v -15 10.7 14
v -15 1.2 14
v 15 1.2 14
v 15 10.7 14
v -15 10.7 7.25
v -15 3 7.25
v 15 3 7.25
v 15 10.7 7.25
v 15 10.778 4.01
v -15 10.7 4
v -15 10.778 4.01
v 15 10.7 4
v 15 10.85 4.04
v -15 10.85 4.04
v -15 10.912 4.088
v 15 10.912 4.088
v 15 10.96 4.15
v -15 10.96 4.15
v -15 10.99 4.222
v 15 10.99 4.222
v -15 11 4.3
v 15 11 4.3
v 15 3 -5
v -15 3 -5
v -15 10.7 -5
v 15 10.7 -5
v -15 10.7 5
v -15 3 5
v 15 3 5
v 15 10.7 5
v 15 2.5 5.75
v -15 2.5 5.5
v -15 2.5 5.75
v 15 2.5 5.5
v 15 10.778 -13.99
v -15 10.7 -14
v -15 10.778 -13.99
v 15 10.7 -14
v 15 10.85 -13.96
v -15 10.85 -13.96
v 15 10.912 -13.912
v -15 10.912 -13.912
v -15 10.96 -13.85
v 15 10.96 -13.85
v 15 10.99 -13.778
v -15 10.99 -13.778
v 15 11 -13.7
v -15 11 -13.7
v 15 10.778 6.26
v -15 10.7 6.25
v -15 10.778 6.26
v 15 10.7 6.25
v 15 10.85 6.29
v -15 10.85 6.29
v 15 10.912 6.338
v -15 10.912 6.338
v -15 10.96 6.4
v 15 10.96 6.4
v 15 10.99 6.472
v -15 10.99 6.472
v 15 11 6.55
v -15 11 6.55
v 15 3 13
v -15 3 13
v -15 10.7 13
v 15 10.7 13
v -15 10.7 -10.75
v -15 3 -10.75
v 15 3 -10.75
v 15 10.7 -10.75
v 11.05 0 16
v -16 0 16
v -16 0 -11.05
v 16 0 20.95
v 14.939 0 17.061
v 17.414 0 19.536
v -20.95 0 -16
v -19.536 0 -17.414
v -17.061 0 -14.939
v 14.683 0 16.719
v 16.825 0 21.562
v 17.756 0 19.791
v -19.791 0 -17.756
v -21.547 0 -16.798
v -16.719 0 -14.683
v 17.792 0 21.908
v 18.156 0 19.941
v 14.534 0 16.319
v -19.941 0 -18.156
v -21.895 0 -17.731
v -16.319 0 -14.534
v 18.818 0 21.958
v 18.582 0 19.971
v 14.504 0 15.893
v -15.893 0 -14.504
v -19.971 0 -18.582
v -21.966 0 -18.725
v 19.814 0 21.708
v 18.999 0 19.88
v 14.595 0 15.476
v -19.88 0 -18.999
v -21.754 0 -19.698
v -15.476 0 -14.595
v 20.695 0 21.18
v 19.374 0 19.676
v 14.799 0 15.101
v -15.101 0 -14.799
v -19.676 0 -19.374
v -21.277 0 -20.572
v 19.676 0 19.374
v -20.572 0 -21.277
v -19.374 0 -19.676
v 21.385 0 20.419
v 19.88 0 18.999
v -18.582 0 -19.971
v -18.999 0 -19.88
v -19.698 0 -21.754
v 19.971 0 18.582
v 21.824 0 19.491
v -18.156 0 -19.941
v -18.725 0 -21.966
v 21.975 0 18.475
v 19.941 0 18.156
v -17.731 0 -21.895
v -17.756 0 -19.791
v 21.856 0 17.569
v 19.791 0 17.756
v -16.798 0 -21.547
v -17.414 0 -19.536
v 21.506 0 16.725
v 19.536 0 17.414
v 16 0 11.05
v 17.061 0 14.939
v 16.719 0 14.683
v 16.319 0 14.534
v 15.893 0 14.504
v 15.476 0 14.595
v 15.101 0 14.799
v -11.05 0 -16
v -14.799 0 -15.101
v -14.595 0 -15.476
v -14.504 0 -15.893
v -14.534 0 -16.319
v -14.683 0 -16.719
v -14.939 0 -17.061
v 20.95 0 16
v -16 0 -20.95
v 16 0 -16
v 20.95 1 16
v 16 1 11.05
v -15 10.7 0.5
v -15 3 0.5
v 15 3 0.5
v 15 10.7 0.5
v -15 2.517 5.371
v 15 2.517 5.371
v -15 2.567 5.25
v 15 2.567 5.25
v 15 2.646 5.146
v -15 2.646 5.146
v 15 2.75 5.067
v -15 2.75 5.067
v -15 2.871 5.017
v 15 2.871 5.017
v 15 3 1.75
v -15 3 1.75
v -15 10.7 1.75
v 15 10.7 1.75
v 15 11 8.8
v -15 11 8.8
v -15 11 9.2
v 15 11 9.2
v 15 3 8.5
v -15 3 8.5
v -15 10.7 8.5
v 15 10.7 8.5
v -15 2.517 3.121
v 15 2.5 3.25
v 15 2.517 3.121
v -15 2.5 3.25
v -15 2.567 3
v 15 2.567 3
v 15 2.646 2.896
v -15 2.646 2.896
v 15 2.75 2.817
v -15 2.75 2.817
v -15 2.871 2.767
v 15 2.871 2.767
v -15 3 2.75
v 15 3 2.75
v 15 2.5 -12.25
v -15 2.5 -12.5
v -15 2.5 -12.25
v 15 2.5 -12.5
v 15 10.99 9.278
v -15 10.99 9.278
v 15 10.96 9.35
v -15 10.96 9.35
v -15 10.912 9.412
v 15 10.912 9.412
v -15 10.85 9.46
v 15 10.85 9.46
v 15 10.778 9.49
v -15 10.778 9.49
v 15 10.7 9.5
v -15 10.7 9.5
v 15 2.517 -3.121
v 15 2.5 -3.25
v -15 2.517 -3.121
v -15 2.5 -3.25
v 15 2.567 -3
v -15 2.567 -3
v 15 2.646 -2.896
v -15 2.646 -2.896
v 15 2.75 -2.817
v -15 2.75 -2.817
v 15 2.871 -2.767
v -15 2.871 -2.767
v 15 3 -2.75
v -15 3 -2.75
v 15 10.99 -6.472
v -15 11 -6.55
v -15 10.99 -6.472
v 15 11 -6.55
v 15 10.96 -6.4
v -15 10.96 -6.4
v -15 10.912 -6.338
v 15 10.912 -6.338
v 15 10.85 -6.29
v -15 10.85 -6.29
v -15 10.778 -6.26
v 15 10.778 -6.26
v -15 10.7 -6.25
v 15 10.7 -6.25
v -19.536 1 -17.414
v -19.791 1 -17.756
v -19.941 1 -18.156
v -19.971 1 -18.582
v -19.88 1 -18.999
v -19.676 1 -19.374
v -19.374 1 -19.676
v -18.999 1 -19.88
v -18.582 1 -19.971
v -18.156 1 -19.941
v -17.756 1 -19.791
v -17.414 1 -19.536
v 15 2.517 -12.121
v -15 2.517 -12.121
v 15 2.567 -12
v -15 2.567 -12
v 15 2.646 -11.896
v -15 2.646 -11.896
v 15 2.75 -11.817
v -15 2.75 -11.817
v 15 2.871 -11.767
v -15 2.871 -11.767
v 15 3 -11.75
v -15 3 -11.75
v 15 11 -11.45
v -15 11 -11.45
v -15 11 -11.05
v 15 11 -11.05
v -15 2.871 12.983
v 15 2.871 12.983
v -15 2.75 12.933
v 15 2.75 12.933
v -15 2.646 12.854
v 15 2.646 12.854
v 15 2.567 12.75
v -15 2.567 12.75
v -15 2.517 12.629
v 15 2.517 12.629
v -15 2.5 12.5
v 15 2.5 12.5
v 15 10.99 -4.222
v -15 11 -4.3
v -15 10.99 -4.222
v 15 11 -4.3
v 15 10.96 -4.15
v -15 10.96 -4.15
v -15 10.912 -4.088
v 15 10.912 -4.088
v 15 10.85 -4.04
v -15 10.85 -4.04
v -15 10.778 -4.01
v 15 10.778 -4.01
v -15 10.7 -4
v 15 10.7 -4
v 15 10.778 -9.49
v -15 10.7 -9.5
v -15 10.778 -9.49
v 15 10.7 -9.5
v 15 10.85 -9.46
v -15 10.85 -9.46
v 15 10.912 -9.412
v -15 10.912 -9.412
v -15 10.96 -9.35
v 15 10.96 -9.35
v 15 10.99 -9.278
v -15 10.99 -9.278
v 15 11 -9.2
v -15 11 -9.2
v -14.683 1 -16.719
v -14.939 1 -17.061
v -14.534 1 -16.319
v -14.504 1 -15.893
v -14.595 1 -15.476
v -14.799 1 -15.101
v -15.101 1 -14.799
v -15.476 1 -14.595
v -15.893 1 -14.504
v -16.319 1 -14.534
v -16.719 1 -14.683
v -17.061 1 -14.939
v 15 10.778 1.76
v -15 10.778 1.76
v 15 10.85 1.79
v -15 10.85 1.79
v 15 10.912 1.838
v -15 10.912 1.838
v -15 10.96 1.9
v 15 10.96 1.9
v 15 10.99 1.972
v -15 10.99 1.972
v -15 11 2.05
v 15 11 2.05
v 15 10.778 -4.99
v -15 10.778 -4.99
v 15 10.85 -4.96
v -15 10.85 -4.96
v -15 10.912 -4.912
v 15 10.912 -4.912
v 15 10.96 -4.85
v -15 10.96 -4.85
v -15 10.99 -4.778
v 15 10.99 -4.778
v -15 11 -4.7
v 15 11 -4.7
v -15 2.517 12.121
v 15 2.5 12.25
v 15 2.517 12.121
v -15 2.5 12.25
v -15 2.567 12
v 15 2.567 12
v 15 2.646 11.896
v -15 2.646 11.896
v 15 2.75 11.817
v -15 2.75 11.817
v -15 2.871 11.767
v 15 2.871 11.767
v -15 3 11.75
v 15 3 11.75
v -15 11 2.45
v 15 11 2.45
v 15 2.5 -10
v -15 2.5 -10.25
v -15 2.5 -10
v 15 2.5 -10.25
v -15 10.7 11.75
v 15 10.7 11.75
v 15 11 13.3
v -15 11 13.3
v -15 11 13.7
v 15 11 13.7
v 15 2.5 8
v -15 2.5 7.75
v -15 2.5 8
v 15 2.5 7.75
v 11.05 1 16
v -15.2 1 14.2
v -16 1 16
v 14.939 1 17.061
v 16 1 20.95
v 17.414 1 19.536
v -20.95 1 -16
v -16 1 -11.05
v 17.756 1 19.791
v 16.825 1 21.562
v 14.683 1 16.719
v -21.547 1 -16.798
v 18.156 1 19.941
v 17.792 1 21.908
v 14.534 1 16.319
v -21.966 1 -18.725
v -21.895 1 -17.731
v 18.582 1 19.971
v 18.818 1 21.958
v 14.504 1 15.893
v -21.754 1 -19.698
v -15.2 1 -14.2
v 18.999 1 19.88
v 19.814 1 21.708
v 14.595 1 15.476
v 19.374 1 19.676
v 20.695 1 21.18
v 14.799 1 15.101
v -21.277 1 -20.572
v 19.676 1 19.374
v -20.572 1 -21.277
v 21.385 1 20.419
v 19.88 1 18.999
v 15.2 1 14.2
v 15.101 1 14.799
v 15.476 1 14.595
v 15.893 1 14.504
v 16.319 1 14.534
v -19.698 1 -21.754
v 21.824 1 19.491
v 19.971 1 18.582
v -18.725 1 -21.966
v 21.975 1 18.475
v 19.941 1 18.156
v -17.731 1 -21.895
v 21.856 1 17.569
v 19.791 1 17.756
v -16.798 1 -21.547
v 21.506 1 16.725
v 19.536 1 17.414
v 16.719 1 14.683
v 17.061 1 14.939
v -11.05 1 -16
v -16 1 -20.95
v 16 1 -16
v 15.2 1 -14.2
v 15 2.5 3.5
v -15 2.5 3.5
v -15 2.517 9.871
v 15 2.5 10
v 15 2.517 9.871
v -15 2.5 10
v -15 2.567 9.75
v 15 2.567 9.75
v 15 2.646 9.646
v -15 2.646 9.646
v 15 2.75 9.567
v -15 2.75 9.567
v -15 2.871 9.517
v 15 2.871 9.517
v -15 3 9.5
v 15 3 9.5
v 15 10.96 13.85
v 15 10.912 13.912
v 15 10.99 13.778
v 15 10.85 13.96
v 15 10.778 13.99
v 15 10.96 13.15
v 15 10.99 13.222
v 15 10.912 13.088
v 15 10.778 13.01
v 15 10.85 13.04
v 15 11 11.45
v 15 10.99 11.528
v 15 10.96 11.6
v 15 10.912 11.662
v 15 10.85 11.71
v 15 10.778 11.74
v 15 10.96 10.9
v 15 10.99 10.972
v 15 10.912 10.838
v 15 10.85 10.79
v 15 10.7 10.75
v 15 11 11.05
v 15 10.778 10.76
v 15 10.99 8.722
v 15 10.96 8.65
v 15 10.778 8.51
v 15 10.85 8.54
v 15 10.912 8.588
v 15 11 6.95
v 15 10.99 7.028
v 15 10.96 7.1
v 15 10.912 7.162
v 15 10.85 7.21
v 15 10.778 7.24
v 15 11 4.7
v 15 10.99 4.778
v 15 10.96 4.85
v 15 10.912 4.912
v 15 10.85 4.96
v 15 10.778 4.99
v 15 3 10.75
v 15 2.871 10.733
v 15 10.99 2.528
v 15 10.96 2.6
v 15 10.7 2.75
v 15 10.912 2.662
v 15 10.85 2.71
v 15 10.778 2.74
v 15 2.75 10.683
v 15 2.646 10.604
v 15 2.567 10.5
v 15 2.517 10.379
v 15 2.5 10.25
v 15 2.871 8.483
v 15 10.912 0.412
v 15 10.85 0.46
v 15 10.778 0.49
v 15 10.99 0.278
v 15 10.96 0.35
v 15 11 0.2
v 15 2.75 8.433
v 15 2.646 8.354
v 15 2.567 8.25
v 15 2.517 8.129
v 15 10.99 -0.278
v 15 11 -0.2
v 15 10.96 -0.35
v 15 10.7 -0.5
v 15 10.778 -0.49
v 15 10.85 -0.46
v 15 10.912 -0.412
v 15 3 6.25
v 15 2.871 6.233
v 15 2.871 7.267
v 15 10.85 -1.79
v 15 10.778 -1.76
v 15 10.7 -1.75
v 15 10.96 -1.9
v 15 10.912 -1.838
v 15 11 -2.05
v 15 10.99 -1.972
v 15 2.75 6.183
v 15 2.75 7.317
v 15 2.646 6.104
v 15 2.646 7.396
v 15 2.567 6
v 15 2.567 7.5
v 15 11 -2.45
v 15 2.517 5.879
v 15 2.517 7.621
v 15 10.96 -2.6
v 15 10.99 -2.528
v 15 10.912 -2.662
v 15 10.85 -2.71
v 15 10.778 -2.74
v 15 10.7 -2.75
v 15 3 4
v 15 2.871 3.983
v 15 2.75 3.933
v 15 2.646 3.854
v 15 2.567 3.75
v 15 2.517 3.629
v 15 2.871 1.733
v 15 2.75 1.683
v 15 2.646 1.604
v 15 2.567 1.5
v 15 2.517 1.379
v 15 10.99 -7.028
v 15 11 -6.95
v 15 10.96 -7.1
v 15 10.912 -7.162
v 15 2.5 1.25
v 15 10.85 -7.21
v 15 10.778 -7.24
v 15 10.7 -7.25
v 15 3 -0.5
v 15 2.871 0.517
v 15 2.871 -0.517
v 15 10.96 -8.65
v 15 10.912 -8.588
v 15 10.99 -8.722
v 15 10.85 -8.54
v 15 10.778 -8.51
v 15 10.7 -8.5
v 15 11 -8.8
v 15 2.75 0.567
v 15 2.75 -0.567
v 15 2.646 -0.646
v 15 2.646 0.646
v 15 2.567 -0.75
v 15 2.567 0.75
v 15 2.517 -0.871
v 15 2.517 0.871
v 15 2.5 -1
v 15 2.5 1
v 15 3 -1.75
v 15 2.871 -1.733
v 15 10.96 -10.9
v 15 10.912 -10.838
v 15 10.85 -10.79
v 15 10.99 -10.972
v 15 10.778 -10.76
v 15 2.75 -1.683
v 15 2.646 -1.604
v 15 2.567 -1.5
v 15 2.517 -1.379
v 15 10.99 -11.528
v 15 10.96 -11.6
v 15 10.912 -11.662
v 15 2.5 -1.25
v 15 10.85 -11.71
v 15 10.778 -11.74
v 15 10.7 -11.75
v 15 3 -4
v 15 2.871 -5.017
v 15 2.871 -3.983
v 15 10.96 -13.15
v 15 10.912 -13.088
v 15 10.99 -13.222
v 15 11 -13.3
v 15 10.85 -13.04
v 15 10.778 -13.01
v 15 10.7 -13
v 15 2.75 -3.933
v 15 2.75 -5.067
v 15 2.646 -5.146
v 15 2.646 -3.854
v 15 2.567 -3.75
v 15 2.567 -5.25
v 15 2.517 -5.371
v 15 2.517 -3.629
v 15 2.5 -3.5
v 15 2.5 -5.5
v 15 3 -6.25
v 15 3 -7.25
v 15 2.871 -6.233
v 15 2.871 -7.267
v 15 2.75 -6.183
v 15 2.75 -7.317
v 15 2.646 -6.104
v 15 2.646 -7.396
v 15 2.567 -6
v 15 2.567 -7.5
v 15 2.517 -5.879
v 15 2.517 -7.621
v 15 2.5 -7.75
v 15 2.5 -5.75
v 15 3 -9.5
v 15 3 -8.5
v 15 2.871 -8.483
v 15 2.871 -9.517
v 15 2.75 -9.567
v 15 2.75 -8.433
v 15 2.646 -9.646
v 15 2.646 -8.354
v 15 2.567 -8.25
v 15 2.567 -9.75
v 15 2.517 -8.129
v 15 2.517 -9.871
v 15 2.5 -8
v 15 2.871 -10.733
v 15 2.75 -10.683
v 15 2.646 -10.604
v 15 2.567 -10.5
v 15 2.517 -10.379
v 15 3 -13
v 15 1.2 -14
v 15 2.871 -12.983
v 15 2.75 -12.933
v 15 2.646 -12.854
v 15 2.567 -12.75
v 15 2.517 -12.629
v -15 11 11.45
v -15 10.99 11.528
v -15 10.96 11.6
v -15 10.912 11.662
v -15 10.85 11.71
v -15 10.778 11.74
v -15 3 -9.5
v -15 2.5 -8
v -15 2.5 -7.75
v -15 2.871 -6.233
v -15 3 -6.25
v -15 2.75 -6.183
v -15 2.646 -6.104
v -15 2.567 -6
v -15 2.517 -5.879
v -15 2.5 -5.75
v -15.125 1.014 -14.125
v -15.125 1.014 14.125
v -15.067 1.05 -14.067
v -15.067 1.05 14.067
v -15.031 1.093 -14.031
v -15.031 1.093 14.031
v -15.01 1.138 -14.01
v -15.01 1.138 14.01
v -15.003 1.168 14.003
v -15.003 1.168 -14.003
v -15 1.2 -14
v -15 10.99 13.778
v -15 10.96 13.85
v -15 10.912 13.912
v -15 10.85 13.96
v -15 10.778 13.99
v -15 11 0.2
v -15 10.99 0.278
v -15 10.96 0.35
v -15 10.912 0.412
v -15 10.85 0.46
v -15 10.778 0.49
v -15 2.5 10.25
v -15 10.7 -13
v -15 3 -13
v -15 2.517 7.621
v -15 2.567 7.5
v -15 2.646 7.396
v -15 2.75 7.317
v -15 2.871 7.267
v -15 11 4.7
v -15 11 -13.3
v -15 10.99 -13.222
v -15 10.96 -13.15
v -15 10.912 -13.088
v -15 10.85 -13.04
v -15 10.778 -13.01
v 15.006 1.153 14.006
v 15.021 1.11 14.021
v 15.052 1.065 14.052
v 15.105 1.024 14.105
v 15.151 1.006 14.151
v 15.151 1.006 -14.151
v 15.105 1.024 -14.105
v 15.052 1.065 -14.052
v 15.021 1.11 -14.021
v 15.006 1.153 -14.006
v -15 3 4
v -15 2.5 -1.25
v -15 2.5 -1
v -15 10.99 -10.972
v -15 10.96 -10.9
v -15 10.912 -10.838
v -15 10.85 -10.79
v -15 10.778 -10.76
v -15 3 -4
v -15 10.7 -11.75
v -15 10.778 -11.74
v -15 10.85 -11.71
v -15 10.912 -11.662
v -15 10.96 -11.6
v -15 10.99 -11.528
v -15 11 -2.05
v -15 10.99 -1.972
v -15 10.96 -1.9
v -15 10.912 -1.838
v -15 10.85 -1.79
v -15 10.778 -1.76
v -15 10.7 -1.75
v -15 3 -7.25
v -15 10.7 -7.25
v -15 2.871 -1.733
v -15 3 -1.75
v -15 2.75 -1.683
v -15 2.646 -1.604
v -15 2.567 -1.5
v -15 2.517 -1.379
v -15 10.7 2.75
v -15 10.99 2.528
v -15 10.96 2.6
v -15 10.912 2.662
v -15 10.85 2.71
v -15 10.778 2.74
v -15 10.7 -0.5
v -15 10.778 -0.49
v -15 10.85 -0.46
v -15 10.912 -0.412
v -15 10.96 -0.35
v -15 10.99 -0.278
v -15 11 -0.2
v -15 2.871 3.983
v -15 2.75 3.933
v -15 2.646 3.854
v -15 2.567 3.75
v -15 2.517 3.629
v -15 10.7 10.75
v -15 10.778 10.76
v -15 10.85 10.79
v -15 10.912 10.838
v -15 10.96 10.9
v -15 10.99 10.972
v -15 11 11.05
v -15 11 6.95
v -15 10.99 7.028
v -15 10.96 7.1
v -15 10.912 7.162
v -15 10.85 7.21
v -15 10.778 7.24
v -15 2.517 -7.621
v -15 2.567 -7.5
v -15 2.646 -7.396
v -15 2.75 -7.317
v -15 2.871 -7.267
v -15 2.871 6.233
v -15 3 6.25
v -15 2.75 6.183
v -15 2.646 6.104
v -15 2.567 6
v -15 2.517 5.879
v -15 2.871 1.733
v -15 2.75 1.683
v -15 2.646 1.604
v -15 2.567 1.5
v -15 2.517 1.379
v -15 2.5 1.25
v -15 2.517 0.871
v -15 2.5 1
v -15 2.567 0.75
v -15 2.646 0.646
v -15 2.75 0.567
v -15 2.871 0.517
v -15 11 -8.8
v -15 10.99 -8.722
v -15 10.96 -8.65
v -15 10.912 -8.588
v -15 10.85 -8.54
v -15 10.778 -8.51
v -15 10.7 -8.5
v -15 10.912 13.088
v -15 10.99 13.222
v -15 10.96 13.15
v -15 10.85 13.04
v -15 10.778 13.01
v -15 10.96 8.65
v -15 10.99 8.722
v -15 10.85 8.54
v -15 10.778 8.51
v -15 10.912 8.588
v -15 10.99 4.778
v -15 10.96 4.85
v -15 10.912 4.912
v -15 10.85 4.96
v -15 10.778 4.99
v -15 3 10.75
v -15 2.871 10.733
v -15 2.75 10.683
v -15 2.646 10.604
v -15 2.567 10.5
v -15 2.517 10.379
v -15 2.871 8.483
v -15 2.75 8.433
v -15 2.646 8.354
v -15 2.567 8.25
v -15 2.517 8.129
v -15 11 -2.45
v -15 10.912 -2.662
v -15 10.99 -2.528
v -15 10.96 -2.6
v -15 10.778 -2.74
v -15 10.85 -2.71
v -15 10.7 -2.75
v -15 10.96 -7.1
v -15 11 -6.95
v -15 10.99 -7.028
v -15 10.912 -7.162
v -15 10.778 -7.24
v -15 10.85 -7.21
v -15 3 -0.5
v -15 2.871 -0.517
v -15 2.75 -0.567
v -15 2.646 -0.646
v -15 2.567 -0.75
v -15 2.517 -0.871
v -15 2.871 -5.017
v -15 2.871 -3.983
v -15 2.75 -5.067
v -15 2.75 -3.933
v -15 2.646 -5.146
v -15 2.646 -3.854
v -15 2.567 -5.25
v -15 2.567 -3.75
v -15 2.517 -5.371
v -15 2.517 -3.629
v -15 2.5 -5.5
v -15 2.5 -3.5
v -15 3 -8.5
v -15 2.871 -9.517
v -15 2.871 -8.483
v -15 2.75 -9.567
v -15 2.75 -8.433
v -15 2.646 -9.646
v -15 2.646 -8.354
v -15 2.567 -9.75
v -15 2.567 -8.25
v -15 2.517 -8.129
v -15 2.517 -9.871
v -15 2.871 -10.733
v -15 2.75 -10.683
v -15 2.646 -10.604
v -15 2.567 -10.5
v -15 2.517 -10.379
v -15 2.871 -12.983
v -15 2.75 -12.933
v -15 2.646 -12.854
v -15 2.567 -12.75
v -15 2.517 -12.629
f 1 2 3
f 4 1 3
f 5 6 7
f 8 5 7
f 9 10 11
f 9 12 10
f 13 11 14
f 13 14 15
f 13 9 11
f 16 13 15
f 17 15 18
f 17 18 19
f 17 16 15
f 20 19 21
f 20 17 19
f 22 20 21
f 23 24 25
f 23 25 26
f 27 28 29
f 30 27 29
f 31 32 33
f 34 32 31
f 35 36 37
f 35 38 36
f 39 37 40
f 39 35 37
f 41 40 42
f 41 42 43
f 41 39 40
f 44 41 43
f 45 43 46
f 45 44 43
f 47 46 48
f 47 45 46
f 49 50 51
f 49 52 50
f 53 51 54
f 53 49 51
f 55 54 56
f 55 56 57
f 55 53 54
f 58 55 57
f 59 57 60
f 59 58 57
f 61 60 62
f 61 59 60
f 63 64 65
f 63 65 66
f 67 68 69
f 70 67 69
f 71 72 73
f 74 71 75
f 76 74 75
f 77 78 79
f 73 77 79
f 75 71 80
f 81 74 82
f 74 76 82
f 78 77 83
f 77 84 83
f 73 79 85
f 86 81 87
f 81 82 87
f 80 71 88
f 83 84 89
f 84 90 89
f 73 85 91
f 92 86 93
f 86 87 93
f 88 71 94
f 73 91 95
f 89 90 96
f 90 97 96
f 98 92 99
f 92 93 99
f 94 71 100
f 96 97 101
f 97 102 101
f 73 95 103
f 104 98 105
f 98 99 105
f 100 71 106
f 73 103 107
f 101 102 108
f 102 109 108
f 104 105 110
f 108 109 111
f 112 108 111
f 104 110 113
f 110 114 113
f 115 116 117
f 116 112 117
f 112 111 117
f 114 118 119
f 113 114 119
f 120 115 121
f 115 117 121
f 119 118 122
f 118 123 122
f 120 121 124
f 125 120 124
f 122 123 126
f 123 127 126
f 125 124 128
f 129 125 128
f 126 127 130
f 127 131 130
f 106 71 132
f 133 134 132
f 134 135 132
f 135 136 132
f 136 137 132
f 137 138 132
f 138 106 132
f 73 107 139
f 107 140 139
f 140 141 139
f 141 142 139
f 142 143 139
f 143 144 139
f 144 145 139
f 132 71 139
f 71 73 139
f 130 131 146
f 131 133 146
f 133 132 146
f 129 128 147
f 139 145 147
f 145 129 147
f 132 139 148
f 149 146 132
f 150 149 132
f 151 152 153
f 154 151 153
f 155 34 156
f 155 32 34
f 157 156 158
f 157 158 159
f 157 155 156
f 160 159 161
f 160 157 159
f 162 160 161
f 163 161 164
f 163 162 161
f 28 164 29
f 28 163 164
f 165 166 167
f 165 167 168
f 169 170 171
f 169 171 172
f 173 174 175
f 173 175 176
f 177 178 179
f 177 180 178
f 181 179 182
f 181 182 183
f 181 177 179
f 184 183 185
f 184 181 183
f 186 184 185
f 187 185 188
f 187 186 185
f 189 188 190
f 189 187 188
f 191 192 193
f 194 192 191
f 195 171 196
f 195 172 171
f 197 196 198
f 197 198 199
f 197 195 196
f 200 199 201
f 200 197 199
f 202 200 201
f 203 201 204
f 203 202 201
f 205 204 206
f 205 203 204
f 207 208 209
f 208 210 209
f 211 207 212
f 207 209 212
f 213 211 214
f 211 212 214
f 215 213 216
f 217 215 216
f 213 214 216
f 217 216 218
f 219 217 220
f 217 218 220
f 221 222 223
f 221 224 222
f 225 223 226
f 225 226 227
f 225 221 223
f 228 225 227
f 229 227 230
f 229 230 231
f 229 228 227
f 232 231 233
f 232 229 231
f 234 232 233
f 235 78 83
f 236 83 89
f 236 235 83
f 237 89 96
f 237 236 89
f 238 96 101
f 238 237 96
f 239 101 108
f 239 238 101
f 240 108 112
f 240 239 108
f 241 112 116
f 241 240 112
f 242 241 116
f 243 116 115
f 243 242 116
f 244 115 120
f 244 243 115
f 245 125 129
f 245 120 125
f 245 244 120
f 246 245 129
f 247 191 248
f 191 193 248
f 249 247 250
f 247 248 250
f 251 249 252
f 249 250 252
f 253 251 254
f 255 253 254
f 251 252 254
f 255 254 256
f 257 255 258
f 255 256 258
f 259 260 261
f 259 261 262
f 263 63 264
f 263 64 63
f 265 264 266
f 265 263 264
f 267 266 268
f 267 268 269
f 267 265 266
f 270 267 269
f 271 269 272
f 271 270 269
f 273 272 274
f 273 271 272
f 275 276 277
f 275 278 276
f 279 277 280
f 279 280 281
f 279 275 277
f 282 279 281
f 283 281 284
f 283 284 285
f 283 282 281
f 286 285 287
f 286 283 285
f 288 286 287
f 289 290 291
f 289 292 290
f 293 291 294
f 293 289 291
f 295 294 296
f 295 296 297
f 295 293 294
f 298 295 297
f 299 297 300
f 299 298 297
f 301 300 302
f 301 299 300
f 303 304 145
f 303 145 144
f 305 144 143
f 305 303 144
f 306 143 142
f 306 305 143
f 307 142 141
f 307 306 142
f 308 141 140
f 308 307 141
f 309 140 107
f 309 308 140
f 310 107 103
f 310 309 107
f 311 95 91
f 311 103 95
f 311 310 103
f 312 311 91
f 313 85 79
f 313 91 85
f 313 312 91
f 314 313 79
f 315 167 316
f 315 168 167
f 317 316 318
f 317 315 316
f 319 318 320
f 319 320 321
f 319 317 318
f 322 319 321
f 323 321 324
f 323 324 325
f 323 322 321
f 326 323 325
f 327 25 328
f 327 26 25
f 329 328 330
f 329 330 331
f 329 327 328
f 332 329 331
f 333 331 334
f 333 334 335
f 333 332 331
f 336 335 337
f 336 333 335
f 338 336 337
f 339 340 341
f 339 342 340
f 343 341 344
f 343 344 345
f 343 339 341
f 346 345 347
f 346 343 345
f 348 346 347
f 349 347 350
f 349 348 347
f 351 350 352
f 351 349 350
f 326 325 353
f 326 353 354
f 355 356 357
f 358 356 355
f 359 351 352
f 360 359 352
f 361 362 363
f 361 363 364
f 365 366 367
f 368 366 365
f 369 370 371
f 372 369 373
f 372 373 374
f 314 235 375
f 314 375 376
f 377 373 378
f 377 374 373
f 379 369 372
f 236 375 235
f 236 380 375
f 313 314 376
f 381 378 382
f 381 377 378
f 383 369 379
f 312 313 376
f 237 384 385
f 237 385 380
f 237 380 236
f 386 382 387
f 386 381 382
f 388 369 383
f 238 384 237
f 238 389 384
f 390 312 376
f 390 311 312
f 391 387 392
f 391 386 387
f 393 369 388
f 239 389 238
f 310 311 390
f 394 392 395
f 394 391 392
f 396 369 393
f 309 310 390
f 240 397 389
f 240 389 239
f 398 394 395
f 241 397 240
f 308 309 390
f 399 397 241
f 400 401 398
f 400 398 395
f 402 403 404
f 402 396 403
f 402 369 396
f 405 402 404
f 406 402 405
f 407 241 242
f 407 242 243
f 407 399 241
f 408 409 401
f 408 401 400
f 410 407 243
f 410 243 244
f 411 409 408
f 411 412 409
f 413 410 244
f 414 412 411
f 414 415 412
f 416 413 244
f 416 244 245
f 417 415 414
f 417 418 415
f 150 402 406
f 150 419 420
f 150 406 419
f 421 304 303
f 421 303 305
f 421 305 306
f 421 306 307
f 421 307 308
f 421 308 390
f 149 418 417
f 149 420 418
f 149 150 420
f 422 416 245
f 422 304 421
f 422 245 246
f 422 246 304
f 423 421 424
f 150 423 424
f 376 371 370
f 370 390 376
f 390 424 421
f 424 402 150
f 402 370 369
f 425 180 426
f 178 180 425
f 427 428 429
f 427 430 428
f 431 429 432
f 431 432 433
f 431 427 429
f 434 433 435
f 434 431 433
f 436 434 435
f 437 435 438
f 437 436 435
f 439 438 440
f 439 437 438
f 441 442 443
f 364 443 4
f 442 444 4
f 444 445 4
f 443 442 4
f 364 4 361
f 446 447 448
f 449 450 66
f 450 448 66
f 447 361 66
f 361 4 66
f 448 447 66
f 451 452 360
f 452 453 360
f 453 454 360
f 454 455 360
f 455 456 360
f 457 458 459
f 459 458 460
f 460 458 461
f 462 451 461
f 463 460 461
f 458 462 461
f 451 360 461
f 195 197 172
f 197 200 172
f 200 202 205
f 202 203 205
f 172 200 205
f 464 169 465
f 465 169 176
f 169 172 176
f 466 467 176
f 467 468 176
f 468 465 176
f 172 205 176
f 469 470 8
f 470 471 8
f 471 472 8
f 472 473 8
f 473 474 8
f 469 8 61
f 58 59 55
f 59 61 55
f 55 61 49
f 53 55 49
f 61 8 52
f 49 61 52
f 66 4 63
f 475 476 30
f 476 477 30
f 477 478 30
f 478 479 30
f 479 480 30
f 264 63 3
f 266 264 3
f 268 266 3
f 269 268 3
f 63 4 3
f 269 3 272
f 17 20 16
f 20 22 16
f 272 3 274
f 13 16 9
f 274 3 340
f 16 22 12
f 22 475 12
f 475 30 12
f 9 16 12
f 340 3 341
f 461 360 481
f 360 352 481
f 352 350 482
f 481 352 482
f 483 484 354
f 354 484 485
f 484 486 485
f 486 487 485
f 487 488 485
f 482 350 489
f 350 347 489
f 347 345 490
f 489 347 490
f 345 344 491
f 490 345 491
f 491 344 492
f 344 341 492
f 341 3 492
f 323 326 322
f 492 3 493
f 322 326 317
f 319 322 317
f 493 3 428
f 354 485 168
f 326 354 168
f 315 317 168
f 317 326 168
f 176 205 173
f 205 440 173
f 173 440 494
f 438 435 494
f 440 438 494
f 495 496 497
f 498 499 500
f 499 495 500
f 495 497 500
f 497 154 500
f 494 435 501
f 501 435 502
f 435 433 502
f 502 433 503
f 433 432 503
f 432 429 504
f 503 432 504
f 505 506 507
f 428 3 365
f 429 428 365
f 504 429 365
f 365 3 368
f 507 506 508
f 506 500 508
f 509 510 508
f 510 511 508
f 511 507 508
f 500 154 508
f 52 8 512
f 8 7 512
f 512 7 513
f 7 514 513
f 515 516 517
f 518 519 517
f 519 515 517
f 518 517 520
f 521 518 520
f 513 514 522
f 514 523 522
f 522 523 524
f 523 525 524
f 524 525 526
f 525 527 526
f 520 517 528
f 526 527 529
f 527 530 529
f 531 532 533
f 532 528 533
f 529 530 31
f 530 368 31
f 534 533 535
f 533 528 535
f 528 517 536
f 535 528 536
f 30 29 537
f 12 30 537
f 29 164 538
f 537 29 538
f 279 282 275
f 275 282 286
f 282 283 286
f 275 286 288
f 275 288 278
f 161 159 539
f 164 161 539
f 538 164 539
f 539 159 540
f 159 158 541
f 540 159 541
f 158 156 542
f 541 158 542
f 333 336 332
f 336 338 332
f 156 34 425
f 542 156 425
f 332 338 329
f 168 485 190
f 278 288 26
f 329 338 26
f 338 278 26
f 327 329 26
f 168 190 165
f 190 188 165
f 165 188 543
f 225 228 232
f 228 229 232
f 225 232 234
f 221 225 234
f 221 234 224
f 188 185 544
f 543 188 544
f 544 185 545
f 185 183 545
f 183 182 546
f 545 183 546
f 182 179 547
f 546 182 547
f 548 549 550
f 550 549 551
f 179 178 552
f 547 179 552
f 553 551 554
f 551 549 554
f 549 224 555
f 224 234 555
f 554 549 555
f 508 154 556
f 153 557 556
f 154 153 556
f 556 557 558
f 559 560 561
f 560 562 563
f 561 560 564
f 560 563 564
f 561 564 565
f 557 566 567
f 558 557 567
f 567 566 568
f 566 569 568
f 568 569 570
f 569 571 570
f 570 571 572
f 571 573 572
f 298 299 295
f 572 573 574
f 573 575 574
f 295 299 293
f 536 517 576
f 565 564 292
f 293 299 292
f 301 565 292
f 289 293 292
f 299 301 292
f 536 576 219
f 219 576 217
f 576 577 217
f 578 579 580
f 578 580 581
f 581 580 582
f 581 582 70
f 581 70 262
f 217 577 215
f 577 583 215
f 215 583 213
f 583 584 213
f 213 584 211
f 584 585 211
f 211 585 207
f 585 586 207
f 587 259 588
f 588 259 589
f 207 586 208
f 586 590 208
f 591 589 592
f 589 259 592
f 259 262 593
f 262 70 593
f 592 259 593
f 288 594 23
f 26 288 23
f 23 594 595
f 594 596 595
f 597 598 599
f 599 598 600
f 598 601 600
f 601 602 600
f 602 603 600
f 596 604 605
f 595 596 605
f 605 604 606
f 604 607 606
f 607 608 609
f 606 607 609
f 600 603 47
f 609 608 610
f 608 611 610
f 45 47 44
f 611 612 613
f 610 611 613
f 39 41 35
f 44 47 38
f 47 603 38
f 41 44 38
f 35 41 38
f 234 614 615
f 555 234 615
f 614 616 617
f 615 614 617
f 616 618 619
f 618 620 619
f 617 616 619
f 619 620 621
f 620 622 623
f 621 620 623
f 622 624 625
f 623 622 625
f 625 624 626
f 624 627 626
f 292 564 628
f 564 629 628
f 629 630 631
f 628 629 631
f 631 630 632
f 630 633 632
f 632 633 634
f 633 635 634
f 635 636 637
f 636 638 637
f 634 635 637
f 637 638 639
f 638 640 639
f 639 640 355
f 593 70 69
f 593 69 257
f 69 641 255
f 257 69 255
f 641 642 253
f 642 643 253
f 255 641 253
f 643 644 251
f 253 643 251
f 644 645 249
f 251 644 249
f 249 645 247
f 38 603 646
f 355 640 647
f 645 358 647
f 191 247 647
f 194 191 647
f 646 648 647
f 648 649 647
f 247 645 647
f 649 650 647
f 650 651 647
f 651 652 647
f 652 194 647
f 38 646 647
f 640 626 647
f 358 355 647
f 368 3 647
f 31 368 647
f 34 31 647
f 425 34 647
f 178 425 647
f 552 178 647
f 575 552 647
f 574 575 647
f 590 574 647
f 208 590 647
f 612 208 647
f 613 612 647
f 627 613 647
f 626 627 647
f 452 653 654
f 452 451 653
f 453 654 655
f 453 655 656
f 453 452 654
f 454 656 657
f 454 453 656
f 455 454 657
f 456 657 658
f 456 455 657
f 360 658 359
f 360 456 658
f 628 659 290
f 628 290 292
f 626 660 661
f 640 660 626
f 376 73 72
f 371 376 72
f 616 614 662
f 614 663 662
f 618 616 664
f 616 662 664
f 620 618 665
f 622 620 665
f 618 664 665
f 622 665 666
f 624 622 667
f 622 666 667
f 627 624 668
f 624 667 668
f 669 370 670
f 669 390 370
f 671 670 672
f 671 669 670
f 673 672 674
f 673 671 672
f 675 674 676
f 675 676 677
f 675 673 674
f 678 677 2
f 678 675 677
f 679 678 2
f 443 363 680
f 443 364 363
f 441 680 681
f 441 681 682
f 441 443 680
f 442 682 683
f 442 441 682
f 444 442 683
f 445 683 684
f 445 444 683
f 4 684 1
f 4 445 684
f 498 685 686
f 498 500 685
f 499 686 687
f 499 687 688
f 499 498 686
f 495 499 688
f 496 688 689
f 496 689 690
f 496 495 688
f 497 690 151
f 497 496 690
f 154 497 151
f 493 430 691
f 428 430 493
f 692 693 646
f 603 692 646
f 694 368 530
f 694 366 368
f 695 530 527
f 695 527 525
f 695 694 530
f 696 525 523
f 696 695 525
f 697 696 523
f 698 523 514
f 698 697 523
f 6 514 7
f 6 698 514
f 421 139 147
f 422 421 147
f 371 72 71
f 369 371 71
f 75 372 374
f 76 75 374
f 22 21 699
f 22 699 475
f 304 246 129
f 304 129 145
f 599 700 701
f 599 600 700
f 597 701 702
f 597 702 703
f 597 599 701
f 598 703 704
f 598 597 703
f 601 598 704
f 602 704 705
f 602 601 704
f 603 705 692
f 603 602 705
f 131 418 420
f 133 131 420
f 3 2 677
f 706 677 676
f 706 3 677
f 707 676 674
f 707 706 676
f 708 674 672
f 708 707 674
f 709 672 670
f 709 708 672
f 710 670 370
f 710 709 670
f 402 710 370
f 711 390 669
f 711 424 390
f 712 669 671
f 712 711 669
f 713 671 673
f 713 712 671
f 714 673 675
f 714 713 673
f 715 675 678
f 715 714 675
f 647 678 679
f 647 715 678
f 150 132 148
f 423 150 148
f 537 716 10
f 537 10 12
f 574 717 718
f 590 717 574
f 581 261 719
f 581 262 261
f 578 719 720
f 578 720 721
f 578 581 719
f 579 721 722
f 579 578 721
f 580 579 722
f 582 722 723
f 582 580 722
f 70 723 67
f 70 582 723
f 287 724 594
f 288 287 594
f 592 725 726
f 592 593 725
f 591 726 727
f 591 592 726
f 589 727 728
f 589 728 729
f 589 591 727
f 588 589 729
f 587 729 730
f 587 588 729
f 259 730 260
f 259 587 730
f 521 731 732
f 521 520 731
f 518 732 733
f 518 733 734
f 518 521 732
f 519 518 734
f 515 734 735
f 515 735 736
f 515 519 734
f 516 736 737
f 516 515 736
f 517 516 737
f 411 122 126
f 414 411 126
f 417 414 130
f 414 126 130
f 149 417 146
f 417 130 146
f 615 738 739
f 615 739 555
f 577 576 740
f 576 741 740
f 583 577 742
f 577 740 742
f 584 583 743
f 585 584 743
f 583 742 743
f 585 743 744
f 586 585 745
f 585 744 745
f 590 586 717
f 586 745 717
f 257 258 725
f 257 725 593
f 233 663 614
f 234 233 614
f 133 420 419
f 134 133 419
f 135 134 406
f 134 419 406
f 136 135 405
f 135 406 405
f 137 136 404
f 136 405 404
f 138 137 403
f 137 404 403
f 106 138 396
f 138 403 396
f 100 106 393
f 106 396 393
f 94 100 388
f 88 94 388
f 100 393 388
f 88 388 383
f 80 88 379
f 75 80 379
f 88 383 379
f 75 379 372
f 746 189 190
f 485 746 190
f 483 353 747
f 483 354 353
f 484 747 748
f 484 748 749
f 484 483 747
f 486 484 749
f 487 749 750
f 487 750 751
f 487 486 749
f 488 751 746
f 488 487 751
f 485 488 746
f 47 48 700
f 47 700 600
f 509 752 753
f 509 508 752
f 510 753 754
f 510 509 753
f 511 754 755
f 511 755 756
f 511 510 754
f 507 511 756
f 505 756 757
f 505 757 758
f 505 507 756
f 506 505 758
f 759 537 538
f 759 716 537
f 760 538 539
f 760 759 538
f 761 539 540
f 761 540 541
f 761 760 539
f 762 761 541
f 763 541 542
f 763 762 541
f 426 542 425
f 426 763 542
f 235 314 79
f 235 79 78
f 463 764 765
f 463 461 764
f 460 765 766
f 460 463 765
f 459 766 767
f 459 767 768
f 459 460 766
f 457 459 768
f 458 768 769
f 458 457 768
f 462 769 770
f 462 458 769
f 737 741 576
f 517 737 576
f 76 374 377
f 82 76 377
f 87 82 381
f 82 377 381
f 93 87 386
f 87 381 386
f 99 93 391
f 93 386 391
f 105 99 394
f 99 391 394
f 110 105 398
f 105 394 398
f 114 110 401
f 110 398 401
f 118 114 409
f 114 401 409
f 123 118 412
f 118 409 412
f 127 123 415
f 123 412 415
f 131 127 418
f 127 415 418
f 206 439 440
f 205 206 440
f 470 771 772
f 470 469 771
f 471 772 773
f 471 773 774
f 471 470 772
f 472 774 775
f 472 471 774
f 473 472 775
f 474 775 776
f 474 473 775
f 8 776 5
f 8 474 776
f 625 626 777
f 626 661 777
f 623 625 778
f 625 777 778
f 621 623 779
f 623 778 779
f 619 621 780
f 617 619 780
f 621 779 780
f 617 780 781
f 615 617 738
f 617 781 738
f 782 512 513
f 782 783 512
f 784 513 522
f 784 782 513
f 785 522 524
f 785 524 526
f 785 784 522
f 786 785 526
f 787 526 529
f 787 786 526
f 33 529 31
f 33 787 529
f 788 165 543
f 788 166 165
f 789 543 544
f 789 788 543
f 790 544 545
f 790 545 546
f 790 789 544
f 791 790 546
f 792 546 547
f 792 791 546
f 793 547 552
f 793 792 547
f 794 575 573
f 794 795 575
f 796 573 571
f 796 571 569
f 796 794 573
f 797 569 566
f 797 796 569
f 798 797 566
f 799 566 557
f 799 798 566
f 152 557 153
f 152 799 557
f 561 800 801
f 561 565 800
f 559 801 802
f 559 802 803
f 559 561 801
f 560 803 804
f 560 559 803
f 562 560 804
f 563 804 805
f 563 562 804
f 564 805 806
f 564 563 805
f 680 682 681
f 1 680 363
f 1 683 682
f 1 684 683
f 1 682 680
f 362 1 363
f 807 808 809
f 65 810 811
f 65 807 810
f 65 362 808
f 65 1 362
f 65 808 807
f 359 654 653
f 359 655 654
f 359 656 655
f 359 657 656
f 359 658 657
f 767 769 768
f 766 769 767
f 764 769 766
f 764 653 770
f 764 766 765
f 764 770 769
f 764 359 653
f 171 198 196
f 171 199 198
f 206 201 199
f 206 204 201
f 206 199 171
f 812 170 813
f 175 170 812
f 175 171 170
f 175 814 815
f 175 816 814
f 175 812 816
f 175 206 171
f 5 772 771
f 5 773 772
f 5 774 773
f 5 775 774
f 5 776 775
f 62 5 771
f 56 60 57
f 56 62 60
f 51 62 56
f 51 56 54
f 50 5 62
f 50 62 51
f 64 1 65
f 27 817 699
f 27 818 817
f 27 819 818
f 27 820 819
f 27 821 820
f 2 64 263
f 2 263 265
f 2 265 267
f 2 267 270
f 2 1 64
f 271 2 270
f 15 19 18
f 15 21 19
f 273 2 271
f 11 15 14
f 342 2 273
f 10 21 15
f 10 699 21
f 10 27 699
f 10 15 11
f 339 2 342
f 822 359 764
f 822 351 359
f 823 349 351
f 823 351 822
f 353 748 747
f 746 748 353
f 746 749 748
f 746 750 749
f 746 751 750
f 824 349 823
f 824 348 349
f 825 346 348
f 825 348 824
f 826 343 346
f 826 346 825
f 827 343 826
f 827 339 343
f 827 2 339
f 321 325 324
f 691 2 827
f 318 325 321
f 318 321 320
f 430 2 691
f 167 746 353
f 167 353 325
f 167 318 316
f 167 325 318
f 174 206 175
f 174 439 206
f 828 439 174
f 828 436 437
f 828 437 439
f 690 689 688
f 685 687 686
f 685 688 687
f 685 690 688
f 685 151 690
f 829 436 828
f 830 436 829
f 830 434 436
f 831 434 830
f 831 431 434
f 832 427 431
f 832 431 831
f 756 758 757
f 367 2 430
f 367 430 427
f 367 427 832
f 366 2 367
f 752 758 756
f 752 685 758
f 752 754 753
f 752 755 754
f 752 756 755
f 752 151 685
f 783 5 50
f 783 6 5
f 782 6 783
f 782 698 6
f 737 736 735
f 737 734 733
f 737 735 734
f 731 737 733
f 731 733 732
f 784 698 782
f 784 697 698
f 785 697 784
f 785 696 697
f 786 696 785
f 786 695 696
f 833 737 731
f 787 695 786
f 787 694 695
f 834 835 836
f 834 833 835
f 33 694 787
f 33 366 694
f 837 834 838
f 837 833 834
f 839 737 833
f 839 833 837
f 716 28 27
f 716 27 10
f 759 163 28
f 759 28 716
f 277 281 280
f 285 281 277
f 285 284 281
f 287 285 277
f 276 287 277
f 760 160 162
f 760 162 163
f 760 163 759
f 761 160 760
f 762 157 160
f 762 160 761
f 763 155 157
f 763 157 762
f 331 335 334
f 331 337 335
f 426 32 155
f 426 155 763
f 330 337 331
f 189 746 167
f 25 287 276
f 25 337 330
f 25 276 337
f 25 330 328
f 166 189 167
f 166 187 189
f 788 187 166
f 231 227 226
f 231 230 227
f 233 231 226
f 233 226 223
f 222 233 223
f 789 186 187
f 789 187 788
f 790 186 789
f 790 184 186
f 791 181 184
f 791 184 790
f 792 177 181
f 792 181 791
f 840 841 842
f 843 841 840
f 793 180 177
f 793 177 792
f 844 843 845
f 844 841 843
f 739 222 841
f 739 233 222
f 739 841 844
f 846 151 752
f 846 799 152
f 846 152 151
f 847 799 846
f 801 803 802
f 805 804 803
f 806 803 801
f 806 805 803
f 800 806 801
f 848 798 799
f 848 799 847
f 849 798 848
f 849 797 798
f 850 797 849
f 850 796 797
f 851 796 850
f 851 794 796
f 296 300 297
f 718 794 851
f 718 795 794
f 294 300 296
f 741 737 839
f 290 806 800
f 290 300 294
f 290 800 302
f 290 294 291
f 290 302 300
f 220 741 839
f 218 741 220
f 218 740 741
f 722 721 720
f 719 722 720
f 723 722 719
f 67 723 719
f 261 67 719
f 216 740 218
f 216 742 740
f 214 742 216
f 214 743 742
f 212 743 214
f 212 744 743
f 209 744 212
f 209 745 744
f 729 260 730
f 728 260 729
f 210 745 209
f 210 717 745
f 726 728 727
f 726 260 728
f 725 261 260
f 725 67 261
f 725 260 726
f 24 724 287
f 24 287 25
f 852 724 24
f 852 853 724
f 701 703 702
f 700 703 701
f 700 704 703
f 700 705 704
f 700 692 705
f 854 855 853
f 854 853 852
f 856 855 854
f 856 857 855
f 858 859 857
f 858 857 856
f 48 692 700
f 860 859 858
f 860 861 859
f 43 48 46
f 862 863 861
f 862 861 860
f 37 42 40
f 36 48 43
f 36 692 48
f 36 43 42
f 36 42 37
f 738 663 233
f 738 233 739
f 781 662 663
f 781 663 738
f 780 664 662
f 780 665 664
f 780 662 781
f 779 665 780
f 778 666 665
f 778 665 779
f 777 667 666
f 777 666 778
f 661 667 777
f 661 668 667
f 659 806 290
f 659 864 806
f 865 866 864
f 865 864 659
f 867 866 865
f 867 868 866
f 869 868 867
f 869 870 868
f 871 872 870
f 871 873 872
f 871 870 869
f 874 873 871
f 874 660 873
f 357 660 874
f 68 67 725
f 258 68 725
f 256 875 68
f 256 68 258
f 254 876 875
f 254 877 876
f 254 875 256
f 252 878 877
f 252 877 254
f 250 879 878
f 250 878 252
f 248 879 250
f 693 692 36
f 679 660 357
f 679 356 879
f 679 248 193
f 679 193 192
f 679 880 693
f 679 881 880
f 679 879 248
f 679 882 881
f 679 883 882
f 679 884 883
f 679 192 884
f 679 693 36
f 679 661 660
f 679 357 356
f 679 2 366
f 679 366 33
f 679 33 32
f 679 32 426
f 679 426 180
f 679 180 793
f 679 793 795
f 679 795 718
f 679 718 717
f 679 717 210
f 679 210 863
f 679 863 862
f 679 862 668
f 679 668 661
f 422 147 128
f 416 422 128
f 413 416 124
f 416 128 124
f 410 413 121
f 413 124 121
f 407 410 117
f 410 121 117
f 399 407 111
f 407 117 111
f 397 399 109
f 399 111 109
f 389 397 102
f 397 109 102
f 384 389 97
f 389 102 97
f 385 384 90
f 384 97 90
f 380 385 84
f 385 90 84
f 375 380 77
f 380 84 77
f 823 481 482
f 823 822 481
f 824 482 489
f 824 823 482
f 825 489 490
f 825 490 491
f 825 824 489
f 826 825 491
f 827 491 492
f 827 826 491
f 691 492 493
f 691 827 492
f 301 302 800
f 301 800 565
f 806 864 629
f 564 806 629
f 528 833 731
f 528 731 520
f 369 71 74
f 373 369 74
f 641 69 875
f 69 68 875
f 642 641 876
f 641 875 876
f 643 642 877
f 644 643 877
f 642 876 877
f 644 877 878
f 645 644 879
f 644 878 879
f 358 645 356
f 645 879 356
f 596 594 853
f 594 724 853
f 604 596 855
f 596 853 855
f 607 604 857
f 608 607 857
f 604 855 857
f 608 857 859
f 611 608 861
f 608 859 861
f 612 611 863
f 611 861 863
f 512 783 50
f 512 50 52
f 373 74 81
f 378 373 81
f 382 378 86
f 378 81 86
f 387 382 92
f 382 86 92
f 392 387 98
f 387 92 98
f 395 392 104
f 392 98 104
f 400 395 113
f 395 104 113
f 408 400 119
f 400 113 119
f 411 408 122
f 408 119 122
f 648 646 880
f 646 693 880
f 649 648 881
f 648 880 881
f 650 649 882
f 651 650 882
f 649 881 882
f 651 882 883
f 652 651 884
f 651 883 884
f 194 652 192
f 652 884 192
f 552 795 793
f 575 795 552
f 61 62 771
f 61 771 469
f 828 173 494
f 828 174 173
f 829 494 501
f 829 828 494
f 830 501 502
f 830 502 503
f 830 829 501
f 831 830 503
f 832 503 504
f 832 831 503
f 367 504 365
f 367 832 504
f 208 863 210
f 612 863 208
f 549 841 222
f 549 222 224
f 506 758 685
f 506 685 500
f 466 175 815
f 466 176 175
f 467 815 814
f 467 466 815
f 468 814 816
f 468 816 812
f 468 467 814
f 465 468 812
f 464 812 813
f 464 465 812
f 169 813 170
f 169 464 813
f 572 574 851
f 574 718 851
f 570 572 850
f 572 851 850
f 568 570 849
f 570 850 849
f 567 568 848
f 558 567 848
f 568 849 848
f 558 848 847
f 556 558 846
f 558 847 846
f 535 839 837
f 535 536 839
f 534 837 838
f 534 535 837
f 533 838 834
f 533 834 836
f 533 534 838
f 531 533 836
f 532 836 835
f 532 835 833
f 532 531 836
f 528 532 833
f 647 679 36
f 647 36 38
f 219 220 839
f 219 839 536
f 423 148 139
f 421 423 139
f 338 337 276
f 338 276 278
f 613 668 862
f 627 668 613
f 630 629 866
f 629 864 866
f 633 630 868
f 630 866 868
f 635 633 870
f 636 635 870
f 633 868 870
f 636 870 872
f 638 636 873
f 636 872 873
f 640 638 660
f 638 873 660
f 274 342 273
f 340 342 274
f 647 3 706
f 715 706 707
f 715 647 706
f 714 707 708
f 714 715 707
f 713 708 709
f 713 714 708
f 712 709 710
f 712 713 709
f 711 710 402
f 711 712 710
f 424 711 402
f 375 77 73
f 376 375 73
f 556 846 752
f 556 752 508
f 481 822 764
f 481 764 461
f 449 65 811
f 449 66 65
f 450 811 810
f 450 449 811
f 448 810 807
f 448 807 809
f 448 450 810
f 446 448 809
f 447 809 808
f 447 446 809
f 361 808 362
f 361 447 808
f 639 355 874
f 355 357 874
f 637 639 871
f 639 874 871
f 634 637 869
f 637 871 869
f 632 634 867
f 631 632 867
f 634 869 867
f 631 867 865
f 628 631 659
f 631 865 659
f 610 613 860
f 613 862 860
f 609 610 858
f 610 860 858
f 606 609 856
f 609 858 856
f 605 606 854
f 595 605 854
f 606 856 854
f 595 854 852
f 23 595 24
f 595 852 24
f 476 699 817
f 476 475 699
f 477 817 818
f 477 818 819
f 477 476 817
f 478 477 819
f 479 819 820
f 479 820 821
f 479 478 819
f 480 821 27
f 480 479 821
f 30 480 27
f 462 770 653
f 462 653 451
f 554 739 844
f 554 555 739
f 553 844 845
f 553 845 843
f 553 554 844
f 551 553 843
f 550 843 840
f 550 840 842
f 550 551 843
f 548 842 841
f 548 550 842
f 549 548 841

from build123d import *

# Parameters (mm, degrees)
DODANIE_WYCI_GNI_CIE2_DEPTH = 1
WYTNIJ_WYCI_GNI_CIE1_DEPTH  = 32.093249288
SZKIC4_W                    = 30
SZKIC4_H                    = 28
DODANIE_WYCI_GNI_CIE3_DEPTH = 1.5
SZKIC3_W                    = 30
SZKIC3_H                    = 1
DODANIE_WYCI_GNI_CIE4_DEPTH = 10
ZAOKR_GLENIE1_R             = 0.3
ZAOKR_GLENIE2_R             = 0.5
ZAOKR_GLENIE3_R             = 0.2


with BuildPart() as part:
    # Szkic1 → Dodanie-wyciągnięcie2 (new body)
    with BuildSketch(Plane(origin=(0, 0, 0), x_dir=(1, 0, 0), z_dir=(0, 1, 0))):
        with BuildLine():
            ThreePointArc((-14.974873734, 18.474873734), (-15.24129537, 19.814265747), (-16, 20.949747468))
            Line((-16, 20.949747468), (-20.949747468, 16))
            ThreePointArc((-20.949747468, 16), (-18.474873734, 14.974873734), (-16, 16))
            ThreePointArc((-16, 16), (-15.24129537, 17.135481721), (-14.974873734, 18.474873734))
        make_face()
        with BuildLine():
            Line((-20.949747468, 16), (-16, 20.949747468))
            ThreePointArc((-16, 20.949747468), (-20.949747468, 20.949747468), (-20.949747468, 16))
        make_face()
        with BuildLine():
            Line((-11.050252532, 16), (-16, 20.949747468))
            ThreePointArc((-16, 20.949747468), (-15.24129537, 19.814265747), (-14.974873734, 18.474873734))
            ThreePointArc((-14.974873734, 18.474873734), (-15.24129537, 17.135481721), (-16, 16))
            Line((-16, 16), (-11.050252532, 16))
        make_face()
        Polygon((16, -11.050252532), (-11.050252532, 16), (-16, 16), (-16, 11.050252532), (11.050252532, -16), (16, -16), align=None)
        with BuildLine():
            ThreePointArc((-16, 16), (-18.474873734, 14.974873734), (-20.949747468, 16))
            Line((-20.949747468, 16), (-16, 11.050252532))
            Line((-16, 11.050252532), (-16, 16))
        make_face()
        Polygon((11.050252532, -16), (-16, 11.050252532), (-16, -16), align=None)
        Polygon((16, 16), (-11.050252532, 16), (16, -11.050252532), align=None)
        with BuildLine():
            Line((20.949747468, -16), (16, -11.050252532))
            Line((16, -11.050252532), (16, -16))
            ThreePointArc((16, -16), (18.474873734, -14.974873734), (20.949747468, -16))
        make_face()
        with BuildLine():
            ThreePointArc((21.974873734, -18.474873734), (21.708452098, -17.135481721), (20.949747468, -16))
            Line((20.949747468, -16), (16, -20.949747468))
            ThreePointArc((16, -20.949747468), (19.814265747, -21.708452098), (21.974873734, -18.474873734))
        make_face()
        with BuildLine():
            Line((16, -20.949747468), (20.949747468, -16))
            ThreePointArc((20.949747468, -16), (18.474873734, -14.974873734), (16, -16))
            ThreePointArc((16, -16), (14.974873734, -18.474873734), (16, -20.949747468))
        make_face()
        with BuildLine():
            ThreePointArc((16, -20.949747468), (14.974873734, -18.474873734), (16, -16))
            Line((16, -16), (11.050252532, -16))
            Line((11.050252532, -16), (16, -20.949747468))
        make_face()
    extrude(amount=DODANIE_WYCI_GNI_CIE2_DEPTH)

    # Szkic2 → Wytnij-wyciągnięcie1 (cut, through all)
    with BuildSketch(Plane(origin=(0, 1, 0), x_dir=(1, 0, 0), z_dir=(0, 1, 0))):
        with BuildLine():
            Line((-17.414213562, 19.535533906), (-14.939339828, 17.060660172))
            ThreePointArc((-14.939339828, 17.060660172), (-14.939339828, 14.939339828), (-17.060660172, 14.939339828))
            Line((-17.060660172, 14.939339828), (-19.535533906, 17.414213562))
            ThreePointArc((-19.535533906, 17.414213562), (-19.535533906, 19.535533906), (-17.414213562, 19.535533906))
        make_face()
        with BuildLine():
            Line((19.535533906, -17.414213562), (17.060660172, -14.939339828))
            ThreePointArc((17.060660172, -14.939339828), (14.939339828, -14.939339828), (14.939339828, -17.060660172))
            Line((14.939339828, -17.060660172), (17.414213562, -19.535533906))
            ThreePointArc((17.414213562, -19.535533906), (19.535533906, -19.535533906), (19.535533906, -17.414213562))
        make_face()
    extrude(amount=-WYTNIJ_WYCI_GNI_CIE1_DEPTH, mode=Mode.SUBTRACT)

    # Szkic4 → Dodanie-wyciągnięcie3 (add)
    with BuildSketch(Plane(origin=(0, 1, 0), x_dir=(1, 0, 0), z_dir=(0, 1, 0))):
        Rectangle(SZKIC4_W, SZKIC4_H)
    extrude(amount=DODANIE_WYCI_GNI_CIE3_DEPTH)

    # Szkic3 → Dodanie-wyciągnięcie4 (add)
    with BuildSketch(Plane(origin=(0, 1, 0), x_dir=(1, 0, 0), z_dir=(0, 1, 0))):
        with Locations((0, 13.5)):
            Rectangle(SZKIC3_W, SZKIC3_H)
        with Locations((0, 4.5)):
            Rectangle(SZKIC3_W, SZKIC3_H)
        with Locations((0, -4.5)):
            Rectangle(SZKIC3_W, SZKIC3_H)
        with Locations((0, -11.25)):
            Rectangle(SZKIC3_W, SZKIC3_H)
        with Locations((0, -13.5)):
            Rectangle(SZKIC3_W, SZKIC3_H)
        with Locations((0, 11.25)):
            Rectangle(SZKIC3_W, SZKIC3_H)
        with Locations((0, 9)):
            Rectangle(SZKIC3_W, SZKIC3_H)
        with Locations((0, 6.75)):
            Rectangle(SZKIC3_W, SZKIC3_H)
        with Locations((0, 2.25)):
            Rectangle(SZKIC3_W, SZKIC3_H)
        Rectangle(SZKIC3_W, SZKIC3_H)
        with Locations((0, -2.25)):
            Rectangle(SZKIC3_W, SZKIC3_H)
        with Locations((0, -6.75)):
            Rectangle(SZKIC3_W, SZKIC3_H)
        with Locations((0, -9)):
            Rectangle(SZKIC3_W, SZKIC3_H)
    extrude(amount=DODANIE_WYCI_GNI_CIE4_DEPTH)

    # Zaokrąglenie1
    zaokr_glenie1_edges = [part.edges().sort_by_distance(p)[0] for p in [
        (0, 11, -5),
        (0, 11, -4),
        (0, 11, 4),
        (0, 11, 5),
        (0, 11, 10.75),
        (0, 11, 11.75),
        (0, 11, 13),
        (0, 11, 14),
        (0, 11, -11.75),
        (0, 11, -10.75),
        (0, 11, -9.5),
        (0, 11, -8.5),
        (0, 11, -7.25),
        (0, 11, -6.25),
        (0, 11, -2.75),
        (0, 11, -1.75),
        (0, 11, -0.5),
        (0, 11, 0.5),
        (0, 11, 1.75),
        (0, 11, 2.75),
        (0, 11, 6.25),
        (0, 11, 7.25),
        (0, 11, 8.5),
        (0, 11, 9.5),
        (0, 11, -14),
        (0, 11, -13),
    ]]
    fillet(zaokr_glenie1_edges, radius=ZAOKR_GLENIE1_R)

    # Zaokrąglenie2
    zaokr_glenie2_edges = [part.edges().sort_by_distance(p)[0] for p in [
        (0, 2.5, -4),
        (0, 2.5, -5),
        (0, 2.5, 5),
        (0, 2.5, 4),
        (0, 2.5, 11.75),
        (0, 2.5, 10.75),
        (0, 2.5, 13),
        (0, 2.5, -10.75),
        (0, 2.5, -11.75),
        (0, 2.5, -8.5),
        (0, 2.5, -9.5),
        (0, 2.5, -6.25),
        (0, 2.5, -7.25),
        (0, 2.5, -1.75),
        (0, 2.5, -2.75),
        (0, 2.5, 0.5),
        (0, 2.5, -0.5),
        (0, 2.5, 2.75),
        (0, 2.5, 1.75),
        (0, 2.5, 7.25),
        (0, 2.5, 6.25),
        (0, 2.5, 9.5),
        (0, 2.5, 8.5),
        (0, 2.5, -13),
    ]]
    fillet(zaokr_glenie2_edges, radius=ZAOKR_GLENIE2_R)

    # Zaokrąglenie3
    zaokr_glenie3_edges = [part.edges().sort_by_distance(p)[0] for p in [
        (-15, 1, 0),
        (0, 1, 14),
        (15, 1, 0),
        (0, 1, -14),
    ]]
    fillet(zaokr_glenie3_edges, radius=ZAOKR_GLENIE3_R)


solid = part.part
